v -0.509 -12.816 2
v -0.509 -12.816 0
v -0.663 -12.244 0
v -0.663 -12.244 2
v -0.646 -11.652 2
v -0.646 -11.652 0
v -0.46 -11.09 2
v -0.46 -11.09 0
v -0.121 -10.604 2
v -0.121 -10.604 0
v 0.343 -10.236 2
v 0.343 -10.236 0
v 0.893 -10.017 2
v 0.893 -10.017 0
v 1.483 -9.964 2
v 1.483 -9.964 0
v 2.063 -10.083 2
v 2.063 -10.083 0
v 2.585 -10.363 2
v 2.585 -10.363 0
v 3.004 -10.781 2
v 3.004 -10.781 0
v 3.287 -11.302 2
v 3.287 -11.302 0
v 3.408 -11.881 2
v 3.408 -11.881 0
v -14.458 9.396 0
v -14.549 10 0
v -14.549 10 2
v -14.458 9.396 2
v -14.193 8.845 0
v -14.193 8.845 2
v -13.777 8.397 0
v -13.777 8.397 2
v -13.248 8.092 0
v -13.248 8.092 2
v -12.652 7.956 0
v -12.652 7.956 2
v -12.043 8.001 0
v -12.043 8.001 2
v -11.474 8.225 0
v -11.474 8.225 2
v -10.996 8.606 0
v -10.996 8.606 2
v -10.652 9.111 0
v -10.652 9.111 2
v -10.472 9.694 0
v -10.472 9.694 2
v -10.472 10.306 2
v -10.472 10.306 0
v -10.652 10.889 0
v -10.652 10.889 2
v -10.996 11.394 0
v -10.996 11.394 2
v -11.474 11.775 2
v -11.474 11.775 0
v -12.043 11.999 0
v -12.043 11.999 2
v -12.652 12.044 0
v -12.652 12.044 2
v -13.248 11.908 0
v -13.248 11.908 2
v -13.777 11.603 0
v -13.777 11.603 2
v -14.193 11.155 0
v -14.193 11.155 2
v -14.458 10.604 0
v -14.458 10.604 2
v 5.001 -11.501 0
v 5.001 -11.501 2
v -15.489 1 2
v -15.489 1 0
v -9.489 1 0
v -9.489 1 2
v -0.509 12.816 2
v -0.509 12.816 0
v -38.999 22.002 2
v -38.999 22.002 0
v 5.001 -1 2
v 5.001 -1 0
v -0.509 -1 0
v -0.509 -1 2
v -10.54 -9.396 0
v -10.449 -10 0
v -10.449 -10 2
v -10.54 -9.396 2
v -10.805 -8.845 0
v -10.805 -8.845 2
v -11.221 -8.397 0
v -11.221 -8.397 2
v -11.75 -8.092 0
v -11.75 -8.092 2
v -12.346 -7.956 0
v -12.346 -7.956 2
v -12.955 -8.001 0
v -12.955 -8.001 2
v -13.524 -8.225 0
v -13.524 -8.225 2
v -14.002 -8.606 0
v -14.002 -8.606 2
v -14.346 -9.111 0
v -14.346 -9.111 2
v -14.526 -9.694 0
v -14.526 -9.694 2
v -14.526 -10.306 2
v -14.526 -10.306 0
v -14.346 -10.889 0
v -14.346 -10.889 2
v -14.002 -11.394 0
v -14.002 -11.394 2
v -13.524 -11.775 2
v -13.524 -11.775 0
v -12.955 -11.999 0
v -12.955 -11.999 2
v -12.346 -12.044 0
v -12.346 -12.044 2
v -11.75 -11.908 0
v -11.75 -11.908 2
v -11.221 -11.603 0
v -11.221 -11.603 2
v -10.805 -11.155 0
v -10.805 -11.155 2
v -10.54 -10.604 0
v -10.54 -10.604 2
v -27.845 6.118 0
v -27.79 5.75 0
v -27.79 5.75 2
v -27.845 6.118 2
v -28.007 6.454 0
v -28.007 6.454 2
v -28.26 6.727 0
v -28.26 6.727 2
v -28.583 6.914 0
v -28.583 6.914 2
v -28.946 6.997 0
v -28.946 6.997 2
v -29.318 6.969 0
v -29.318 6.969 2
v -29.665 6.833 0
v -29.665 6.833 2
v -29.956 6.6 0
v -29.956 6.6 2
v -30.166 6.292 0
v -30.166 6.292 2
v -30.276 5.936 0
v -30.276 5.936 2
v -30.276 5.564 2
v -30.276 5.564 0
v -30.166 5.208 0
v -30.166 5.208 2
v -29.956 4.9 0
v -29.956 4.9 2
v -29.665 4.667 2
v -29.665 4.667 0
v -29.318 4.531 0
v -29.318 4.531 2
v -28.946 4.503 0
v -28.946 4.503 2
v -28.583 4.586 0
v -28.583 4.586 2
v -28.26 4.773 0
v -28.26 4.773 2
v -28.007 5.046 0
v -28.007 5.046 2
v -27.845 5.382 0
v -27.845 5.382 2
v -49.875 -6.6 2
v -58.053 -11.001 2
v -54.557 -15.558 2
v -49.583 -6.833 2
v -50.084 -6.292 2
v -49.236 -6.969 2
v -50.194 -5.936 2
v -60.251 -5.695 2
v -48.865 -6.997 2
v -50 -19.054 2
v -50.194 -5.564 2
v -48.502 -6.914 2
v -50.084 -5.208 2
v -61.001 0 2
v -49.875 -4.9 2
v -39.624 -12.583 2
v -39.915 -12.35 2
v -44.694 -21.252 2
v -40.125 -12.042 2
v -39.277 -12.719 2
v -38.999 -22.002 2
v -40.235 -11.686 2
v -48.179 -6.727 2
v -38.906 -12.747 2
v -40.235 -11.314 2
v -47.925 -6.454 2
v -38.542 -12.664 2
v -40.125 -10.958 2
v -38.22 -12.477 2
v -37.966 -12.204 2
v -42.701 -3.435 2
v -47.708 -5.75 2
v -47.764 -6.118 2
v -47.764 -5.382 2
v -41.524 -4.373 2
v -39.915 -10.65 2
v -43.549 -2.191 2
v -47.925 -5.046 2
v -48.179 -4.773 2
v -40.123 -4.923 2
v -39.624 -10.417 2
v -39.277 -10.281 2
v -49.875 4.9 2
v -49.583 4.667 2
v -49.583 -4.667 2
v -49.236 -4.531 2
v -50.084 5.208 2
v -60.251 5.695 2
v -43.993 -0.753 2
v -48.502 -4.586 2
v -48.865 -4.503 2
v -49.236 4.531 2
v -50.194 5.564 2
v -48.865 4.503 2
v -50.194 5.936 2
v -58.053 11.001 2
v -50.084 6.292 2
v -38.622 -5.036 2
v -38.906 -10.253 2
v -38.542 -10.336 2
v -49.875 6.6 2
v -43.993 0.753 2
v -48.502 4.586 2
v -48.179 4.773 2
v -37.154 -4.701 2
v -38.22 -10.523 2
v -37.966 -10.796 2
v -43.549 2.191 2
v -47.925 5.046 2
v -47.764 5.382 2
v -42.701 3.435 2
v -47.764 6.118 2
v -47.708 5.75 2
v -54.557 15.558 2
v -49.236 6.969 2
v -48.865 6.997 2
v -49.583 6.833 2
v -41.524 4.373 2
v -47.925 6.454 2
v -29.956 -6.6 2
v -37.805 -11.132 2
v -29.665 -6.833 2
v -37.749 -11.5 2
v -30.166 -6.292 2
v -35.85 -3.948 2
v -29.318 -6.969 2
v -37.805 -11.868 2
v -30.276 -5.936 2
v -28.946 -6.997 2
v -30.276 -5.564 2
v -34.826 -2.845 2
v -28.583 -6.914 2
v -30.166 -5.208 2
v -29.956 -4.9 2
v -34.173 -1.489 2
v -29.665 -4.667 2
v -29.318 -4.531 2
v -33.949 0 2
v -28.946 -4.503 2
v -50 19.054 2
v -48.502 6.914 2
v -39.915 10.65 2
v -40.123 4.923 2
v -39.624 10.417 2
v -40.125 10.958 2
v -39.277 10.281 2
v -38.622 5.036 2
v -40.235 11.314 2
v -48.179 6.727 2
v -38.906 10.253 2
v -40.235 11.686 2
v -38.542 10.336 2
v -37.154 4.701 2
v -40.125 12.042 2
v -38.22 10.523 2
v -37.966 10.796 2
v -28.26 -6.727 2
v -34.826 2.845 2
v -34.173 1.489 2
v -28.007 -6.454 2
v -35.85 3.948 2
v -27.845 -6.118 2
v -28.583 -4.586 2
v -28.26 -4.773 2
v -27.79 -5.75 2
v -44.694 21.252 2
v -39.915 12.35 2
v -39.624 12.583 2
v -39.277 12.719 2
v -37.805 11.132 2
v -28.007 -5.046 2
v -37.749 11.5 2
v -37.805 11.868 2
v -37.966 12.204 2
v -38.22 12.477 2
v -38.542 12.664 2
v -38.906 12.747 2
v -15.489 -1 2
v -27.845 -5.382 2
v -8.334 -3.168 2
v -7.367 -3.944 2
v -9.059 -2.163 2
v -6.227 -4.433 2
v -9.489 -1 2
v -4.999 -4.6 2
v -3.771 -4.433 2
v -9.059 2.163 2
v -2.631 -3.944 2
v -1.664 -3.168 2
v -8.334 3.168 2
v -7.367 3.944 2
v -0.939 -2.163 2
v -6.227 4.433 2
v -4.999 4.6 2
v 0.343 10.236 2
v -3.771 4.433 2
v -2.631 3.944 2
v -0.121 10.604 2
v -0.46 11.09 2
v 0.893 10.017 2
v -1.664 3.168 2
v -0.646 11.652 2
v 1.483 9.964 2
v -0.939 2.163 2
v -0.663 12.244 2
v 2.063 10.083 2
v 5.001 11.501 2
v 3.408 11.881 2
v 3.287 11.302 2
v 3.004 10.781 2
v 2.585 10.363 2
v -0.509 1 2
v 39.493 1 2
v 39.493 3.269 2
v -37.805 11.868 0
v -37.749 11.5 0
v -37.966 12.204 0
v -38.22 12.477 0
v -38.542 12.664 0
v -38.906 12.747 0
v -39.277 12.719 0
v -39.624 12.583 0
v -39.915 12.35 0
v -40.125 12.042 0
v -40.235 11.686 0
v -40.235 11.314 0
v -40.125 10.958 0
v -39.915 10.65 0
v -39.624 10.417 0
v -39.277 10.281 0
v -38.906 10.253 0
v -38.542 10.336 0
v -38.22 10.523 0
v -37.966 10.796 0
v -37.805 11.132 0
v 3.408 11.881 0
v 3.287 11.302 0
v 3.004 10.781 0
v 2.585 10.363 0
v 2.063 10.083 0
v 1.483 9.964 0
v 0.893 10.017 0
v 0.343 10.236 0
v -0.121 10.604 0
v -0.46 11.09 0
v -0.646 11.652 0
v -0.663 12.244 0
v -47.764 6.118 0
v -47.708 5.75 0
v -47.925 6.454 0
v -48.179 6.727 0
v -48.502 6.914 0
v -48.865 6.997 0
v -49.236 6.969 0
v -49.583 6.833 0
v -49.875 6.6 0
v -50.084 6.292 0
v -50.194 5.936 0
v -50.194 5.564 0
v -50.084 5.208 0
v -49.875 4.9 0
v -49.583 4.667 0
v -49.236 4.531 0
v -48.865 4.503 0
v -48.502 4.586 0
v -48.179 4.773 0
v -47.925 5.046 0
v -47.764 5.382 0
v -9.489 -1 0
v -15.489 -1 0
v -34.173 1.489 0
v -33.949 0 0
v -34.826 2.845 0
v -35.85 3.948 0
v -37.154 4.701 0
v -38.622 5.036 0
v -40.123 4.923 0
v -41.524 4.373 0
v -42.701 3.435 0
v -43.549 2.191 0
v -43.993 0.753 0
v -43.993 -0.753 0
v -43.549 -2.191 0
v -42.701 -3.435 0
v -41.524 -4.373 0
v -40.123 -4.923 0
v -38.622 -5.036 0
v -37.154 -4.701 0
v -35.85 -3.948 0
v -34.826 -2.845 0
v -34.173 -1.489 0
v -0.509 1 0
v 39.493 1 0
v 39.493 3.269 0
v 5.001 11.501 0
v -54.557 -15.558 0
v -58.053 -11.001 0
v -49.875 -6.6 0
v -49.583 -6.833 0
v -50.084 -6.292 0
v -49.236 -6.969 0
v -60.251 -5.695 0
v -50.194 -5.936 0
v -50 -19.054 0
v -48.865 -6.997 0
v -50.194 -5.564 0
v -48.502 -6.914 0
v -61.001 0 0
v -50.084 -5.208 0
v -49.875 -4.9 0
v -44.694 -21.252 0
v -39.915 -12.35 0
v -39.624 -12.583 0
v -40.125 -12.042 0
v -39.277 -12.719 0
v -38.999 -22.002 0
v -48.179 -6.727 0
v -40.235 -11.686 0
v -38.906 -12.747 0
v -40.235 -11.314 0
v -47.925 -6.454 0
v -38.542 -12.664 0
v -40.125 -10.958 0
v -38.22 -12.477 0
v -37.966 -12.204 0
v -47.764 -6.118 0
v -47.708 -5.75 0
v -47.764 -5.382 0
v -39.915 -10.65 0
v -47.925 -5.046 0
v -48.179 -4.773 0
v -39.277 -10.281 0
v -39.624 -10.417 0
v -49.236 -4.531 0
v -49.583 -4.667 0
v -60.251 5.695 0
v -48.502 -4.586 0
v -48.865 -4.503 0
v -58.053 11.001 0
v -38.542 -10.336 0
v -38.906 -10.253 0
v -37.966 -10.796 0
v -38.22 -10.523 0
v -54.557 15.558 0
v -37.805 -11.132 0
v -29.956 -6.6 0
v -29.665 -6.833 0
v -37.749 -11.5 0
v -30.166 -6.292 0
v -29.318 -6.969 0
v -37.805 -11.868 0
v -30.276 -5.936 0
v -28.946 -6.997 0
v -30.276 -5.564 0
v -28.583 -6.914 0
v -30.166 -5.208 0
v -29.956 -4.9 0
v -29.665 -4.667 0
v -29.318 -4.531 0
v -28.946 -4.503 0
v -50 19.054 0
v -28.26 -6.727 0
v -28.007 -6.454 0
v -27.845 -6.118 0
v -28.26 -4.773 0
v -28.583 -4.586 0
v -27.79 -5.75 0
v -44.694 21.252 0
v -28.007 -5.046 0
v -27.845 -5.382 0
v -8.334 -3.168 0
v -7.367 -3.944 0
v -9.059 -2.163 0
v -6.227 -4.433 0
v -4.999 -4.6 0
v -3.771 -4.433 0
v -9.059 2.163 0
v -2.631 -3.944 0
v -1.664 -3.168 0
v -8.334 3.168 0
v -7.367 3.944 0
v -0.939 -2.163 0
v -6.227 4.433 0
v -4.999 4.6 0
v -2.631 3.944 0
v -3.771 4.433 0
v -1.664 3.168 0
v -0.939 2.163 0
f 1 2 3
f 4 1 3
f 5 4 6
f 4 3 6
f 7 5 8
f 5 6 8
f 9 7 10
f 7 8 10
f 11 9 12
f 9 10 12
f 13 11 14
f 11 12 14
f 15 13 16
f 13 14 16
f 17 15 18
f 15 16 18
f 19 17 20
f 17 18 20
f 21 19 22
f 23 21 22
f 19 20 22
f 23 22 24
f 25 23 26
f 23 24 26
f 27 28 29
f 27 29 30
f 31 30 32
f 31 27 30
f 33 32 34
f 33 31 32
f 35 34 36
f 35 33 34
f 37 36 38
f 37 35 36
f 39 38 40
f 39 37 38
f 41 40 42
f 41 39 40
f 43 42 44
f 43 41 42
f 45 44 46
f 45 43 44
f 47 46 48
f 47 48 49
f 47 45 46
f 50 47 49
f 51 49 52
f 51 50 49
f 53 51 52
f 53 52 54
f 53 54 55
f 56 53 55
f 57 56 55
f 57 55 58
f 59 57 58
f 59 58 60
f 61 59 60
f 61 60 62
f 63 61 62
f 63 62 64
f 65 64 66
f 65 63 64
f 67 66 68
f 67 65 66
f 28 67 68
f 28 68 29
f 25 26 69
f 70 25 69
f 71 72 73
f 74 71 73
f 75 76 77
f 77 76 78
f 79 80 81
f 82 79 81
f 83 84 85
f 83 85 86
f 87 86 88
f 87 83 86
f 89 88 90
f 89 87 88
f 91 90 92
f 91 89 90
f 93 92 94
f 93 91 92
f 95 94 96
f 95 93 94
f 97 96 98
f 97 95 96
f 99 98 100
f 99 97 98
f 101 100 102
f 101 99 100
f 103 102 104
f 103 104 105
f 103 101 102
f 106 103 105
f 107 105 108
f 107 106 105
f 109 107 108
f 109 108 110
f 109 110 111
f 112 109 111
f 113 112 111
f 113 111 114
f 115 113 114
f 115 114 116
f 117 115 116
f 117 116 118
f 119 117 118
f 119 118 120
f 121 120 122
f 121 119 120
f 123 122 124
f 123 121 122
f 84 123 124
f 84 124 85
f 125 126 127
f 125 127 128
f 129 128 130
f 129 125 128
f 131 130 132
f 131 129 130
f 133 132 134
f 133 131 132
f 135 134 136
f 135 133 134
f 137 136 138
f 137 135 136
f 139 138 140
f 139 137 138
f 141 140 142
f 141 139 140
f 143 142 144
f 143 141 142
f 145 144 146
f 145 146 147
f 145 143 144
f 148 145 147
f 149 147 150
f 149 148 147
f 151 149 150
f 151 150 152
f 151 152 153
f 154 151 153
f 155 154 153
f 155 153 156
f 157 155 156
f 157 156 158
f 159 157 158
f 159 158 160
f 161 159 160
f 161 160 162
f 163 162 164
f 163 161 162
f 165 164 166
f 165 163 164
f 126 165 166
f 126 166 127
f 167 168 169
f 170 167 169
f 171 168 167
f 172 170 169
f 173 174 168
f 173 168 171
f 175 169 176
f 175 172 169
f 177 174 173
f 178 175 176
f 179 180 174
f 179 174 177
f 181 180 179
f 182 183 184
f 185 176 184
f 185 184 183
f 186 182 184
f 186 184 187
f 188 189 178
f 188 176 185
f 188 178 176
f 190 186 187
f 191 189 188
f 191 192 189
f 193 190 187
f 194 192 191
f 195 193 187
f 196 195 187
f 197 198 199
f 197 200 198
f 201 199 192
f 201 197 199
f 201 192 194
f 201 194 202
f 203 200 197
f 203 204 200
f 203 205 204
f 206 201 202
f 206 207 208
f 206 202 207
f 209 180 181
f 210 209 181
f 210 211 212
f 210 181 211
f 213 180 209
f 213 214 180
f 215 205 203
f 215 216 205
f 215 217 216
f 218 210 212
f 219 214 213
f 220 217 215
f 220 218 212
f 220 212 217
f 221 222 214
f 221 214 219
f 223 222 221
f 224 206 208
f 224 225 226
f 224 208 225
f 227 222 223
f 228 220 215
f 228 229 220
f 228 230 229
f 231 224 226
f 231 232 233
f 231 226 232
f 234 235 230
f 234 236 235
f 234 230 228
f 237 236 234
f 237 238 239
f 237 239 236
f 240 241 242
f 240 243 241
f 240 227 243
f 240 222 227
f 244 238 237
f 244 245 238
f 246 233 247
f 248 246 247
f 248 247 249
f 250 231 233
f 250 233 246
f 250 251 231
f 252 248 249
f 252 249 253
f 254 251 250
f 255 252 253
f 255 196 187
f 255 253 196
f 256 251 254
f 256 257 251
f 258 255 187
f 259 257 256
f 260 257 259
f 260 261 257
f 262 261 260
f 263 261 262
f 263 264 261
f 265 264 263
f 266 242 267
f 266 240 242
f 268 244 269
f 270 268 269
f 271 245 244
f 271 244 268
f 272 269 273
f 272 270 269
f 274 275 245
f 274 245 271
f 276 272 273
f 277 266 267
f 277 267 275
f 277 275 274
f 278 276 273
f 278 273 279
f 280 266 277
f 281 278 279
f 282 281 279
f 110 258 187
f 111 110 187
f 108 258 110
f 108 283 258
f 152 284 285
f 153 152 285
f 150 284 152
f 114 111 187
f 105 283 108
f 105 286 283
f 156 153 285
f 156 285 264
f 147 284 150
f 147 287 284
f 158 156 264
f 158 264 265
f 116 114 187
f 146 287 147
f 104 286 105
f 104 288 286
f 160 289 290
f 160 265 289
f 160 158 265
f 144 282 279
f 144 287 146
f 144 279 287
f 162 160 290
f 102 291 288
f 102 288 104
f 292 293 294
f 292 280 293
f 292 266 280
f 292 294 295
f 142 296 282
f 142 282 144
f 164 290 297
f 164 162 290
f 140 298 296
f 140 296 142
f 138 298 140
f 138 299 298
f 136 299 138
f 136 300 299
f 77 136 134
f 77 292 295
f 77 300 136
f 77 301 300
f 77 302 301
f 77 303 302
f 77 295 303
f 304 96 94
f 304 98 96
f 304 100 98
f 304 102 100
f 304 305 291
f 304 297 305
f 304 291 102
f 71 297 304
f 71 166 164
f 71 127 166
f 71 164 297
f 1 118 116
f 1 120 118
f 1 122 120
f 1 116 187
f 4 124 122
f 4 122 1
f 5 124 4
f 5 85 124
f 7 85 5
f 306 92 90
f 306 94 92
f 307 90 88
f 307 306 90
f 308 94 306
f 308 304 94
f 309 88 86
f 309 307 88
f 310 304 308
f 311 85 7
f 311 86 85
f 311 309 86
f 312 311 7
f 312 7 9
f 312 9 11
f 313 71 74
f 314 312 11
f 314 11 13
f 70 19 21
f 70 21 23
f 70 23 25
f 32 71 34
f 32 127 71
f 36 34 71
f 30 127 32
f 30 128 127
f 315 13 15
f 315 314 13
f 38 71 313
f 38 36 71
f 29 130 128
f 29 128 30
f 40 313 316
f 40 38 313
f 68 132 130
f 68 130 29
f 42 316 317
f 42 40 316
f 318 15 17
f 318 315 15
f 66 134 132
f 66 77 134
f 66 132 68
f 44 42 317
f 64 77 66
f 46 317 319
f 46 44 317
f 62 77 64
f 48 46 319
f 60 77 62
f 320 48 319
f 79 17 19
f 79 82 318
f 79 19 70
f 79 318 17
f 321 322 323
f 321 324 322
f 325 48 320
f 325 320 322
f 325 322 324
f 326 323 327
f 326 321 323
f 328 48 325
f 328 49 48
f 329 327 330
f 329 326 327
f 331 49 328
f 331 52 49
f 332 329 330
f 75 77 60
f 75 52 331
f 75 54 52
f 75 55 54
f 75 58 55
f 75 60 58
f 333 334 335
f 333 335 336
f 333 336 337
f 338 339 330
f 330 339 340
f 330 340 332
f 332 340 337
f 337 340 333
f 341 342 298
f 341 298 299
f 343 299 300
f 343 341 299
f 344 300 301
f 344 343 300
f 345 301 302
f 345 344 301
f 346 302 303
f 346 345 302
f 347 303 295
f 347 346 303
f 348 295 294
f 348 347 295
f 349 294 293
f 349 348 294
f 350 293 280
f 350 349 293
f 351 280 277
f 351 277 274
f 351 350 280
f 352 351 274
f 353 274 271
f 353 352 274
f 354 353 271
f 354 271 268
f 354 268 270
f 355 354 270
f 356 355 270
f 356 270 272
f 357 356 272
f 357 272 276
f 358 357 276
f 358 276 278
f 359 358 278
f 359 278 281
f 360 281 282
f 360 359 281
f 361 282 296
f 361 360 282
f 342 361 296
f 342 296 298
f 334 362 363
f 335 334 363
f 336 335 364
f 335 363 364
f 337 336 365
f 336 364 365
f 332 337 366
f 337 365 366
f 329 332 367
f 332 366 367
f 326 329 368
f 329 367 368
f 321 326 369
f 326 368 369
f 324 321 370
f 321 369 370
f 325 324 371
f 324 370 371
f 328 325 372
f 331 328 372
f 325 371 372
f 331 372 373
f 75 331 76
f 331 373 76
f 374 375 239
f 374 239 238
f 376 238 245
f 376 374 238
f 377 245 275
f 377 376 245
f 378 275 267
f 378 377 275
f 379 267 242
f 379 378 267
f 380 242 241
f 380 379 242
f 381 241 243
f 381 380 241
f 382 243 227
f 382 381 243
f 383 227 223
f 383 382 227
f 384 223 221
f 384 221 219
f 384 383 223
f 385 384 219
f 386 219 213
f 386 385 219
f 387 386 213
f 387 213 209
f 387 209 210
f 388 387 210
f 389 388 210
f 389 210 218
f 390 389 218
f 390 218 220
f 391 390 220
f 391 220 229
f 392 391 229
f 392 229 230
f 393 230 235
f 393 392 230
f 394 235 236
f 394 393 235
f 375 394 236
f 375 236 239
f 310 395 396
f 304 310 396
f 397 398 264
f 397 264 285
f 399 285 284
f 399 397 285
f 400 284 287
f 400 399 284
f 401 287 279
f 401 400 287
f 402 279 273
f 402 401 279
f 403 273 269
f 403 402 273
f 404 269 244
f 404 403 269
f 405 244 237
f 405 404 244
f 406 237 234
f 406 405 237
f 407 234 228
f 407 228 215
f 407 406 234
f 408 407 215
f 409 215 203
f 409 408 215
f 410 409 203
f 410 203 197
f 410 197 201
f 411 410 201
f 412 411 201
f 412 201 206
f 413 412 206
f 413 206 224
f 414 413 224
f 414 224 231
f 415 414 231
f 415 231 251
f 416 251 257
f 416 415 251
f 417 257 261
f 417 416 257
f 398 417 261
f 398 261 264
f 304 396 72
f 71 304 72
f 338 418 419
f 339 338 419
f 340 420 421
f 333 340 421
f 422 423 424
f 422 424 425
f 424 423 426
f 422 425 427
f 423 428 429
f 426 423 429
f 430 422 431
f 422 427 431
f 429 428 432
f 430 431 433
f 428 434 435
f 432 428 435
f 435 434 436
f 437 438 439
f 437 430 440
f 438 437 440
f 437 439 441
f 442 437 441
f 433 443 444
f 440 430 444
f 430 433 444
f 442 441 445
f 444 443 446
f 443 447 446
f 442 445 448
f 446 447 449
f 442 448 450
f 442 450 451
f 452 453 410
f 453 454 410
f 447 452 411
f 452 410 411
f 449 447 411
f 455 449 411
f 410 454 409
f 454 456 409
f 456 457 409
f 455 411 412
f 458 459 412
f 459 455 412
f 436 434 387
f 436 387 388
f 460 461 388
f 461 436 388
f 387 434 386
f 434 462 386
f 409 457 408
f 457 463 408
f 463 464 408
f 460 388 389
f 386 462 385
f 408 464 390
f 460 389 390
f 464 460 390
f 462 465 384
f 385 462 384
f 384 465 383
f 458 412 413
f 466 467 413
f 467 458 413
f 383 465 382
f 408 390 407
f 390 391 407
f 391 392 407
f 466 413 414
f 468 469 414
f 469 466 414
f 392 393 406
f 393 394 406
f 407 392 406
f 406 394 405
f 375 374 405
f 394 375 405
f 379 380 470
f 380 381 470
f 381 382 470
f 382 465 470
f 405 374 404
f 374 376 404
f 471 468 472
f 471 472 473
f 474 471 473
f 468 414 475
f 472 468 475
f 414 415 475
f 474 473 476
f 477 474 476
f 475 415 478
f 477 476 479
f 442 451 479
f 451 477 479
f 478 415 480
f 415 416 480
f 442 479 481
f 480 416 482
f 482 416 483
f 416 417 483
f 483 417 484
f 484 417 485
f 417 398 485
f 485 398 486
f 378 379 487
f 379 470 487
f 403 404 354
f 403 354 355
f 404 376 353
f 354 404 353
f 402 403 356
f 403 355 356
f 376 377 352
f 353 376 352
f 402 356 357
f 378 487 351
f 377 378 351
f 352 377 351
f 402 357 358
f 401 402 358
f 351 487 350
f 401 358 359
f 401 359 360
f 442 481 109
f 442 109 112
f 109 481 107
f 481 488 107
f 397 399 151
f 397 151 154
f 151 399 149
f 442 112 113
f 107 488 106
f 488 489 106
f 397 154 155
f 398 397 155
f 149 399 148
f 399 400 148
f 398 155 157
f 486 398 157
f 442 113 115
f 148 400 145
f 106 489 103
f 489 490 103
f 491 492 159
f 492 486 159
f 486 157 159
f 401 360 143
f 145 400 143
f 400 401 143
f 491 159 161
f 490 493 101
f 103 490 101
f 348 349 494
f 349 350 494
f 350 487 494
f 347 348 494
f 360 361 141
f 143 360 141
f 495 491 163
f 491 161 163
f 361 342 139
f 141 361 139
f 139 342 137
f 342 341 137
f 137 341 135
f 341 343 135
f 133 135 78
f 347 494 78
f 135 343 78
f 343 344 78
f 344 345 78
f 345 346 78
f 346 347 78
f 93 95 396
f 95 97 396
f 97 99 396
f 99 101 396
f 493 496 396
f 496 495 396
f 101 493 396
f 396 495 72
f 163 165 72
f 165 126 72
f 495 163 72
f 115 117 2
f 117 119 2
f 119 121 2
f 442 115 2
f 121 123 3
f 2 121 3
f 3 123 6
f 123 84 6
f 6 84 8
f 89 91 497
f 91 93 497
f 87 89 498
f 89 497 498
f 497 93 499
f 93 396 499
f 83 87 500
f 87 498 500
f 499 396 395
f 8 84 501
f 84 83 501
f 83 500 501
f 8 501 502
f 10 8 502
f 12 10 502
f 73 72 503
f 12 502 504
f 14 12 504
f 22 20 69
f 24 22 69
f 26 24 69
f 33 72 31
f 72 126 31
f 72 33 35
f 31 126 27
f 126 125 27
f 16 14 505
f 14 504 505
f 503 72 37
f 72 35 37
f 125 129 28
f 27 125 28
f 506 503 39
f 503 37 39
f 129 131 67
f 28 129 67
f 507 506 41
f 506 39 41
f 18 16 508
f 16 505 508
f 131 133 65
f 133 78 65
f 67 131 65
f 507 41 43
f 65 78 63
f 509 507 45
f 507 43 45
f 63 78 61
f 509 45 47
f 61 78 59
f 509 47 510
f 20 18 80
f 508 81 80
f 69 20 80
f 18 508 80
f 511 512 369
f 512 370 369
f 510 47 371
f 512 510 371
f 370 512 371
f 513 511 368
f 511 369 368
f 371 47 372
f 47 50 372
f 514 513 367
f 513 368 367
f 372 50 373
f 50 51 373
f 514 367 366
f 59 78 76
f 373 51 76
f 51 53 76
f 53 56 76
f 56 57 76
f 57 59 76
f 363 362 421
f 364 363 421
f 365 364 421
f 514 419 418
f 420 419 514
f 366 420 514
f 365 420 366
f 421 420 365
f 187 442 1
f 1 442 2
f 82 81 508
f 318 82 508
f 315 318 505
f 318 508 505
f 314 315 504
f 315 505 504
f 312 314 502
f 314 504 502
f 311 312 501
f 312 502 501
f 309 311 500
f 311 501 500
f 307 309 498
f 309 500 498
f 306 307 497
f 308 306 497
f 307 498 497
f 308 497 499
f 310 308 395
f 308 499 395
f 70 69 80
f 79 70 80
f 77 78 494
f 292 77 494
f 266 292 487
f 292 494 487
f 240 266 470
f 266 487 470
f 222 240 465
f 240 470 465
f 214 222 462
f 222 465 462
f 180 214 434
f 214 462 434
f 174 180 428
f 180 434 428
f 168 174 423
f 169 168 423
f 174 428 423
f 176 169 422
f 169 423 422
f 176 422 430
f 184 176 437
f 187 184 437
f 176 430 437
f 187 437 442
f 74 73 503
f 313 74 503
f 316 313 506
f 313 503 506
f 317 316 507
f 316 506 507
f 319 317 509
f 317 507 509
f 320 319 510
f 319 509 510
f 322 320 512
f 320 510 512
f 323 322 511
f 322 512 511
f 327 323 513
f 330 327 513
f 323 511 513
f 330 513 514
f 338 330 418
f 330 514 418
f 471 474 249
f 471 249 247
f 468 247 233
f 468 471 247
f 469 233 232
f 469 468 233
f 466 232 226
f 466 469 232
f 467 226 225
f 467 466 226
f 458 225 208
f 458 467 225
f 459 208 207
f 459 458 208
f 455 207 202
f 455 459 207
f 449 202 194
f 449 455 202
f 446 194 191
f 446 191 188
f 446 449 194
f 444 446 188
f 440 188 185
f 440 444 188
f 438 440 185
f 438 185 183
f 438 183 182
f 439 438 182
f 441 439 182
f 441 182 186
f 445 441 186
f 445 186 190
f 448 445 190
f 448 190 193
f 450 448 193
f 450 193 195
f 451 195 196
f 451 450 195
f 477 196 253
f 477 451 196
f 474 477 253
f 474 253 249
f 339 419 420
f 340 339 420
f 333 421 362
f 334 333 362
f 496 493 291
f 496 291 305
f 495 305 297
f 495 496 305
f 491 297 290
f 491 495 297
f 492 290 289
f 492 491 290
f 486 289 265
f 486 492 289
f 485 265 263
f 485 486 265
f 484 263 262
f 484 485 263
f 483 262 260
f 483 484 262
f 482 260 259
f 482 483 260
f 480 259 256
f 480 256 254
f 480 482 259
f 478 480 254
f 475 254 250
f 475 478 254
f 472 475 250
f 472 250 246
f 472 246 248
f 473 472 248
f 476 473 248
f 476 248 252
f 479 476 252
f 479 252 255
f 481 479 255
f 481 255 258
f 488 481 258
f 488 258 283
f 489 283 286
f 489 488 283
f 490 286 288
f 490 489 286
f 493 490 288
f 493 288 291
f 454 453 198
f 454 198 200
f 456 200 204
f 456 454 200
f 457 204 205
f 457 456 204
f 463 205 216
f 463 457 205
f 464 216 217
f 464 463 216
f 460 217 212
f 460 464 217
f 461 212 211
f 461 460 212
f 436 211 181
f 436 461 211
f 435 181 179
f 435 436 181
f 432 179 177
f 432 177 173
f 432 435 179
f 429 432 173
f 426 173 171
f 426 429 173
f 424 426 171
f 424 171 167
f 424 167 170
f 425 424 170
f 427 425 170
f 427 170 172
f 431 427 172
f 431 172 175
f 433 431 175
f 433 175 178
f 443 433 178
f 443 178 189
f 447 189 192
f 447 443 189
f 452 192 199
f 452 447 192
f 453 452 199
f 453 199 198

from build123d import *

# Parameters (mm, degrees)
SKETCH_1_R      = 5.05
SKETCH_1_R_2    = 1.25
SKETCH_1_R_3    = 2.05
EXTRUDE_1_DEPTH = 2


with BuildPart() as part:
    # 草图1 → 凸台-拉伸1 (new body)
    with BuildSketch(Plane.XY):
        with BuildLine():
            Line((-15.488984032, 1), (-9.488984032, 1))
            ThreePointArc((-9.488984032, 1), (-4.998995168, 4.6), (-0.509006304, 1))
            Line((-0.509006304, 1), (5.001004832, 1))
            Line((5.001004832, 1), (39.492739898, 1))
            Line((39.492739898, 1), (39.492739898, 3.269234909))
            Line((39.492739898, 3.269234909), (5.001004832, 11.501004832))
            Line((5.001004832, 11.501004832), (3.407723631, 11.881256049))
            ThreePointArc((3.407723631, 11.881256049), (0.892865212, 10.016888454), (-0.509006304, 12.816019685))
            Line((-0.509006304, 12.816019685), (-38.998995168, 22.002009663))
            ThreePointArc((-38.998995168, 22.002009663), (-61.001004832, 0), (-38.998995168, -22.002009663))
            Line((-38.998995168, -22.002009663), (-0.509006304, -12.816019685))
            ThreePointArc((-0.509006304, -12.816019685), (0.892865212, -10.016888454), (3.407723631, -11.881256049))
            Line((3.407723631, -11.881256049), (5.001004832, -11.501004832))
            Line((5.001004832, -11.501004832), (5.001004832, -1))
            Line((5.001004832, -1), (-0.509006304, -1))
            ThreePointArc((-0.509006304, -1), (-4.998995168, -4.6), (-9.488984032, -1))
            Line((-9.488984032, -1), (-15.488984032, -1))
            Line((-15.488984032, -1), (-15.488984032, 1))
        make_face()
        with Locations((-38.998995168, 0)):
            Circle(SKETCH_1_R, mode=Mode.SUBTRACT)
        with Locations((-38.998995168, -11.5)):
            Circle(SKETCH_1_R_2, mode=Mode.SUBTRACT)
        with Locations((-12.498995168, -10)):
            Circle(SKETCH_1_R_3, mode=Mode.SUBTRACT)
        with Locations((-48.958287312, -5.75)):
            Circle(SKETCH_1_R_2, mode=Mode.SUBTRACT)
        with Locations(Location((-12.498995168, 10, 0), (0, 0, 180))):
            Circle(SKETCH_1_R_3, mode=Mode.SUBTRACT)
        with Locations((-48.958287312, 5.75)):
            Circle(SKETCH_1_R_2, mode=Mode.SUBTRACT)
        with Locations((-38.998995168, 11.5)):
            Circle(SKETCH_1_R_2, mode=Mode.SUBTRACT)
        with Locations((-29.039703025, 5.75)):
            Circle(SKETCH_1_R_2, mode=Mode.SUBTRACT)
        with Locations((-29.039703025, -5.75)):
            Circle(SKETCH_1_R_2, mode=Mode.SUBTRACT)
    extrude(amount=EXTRUDE_1_DEPTH)


solid = part.part
